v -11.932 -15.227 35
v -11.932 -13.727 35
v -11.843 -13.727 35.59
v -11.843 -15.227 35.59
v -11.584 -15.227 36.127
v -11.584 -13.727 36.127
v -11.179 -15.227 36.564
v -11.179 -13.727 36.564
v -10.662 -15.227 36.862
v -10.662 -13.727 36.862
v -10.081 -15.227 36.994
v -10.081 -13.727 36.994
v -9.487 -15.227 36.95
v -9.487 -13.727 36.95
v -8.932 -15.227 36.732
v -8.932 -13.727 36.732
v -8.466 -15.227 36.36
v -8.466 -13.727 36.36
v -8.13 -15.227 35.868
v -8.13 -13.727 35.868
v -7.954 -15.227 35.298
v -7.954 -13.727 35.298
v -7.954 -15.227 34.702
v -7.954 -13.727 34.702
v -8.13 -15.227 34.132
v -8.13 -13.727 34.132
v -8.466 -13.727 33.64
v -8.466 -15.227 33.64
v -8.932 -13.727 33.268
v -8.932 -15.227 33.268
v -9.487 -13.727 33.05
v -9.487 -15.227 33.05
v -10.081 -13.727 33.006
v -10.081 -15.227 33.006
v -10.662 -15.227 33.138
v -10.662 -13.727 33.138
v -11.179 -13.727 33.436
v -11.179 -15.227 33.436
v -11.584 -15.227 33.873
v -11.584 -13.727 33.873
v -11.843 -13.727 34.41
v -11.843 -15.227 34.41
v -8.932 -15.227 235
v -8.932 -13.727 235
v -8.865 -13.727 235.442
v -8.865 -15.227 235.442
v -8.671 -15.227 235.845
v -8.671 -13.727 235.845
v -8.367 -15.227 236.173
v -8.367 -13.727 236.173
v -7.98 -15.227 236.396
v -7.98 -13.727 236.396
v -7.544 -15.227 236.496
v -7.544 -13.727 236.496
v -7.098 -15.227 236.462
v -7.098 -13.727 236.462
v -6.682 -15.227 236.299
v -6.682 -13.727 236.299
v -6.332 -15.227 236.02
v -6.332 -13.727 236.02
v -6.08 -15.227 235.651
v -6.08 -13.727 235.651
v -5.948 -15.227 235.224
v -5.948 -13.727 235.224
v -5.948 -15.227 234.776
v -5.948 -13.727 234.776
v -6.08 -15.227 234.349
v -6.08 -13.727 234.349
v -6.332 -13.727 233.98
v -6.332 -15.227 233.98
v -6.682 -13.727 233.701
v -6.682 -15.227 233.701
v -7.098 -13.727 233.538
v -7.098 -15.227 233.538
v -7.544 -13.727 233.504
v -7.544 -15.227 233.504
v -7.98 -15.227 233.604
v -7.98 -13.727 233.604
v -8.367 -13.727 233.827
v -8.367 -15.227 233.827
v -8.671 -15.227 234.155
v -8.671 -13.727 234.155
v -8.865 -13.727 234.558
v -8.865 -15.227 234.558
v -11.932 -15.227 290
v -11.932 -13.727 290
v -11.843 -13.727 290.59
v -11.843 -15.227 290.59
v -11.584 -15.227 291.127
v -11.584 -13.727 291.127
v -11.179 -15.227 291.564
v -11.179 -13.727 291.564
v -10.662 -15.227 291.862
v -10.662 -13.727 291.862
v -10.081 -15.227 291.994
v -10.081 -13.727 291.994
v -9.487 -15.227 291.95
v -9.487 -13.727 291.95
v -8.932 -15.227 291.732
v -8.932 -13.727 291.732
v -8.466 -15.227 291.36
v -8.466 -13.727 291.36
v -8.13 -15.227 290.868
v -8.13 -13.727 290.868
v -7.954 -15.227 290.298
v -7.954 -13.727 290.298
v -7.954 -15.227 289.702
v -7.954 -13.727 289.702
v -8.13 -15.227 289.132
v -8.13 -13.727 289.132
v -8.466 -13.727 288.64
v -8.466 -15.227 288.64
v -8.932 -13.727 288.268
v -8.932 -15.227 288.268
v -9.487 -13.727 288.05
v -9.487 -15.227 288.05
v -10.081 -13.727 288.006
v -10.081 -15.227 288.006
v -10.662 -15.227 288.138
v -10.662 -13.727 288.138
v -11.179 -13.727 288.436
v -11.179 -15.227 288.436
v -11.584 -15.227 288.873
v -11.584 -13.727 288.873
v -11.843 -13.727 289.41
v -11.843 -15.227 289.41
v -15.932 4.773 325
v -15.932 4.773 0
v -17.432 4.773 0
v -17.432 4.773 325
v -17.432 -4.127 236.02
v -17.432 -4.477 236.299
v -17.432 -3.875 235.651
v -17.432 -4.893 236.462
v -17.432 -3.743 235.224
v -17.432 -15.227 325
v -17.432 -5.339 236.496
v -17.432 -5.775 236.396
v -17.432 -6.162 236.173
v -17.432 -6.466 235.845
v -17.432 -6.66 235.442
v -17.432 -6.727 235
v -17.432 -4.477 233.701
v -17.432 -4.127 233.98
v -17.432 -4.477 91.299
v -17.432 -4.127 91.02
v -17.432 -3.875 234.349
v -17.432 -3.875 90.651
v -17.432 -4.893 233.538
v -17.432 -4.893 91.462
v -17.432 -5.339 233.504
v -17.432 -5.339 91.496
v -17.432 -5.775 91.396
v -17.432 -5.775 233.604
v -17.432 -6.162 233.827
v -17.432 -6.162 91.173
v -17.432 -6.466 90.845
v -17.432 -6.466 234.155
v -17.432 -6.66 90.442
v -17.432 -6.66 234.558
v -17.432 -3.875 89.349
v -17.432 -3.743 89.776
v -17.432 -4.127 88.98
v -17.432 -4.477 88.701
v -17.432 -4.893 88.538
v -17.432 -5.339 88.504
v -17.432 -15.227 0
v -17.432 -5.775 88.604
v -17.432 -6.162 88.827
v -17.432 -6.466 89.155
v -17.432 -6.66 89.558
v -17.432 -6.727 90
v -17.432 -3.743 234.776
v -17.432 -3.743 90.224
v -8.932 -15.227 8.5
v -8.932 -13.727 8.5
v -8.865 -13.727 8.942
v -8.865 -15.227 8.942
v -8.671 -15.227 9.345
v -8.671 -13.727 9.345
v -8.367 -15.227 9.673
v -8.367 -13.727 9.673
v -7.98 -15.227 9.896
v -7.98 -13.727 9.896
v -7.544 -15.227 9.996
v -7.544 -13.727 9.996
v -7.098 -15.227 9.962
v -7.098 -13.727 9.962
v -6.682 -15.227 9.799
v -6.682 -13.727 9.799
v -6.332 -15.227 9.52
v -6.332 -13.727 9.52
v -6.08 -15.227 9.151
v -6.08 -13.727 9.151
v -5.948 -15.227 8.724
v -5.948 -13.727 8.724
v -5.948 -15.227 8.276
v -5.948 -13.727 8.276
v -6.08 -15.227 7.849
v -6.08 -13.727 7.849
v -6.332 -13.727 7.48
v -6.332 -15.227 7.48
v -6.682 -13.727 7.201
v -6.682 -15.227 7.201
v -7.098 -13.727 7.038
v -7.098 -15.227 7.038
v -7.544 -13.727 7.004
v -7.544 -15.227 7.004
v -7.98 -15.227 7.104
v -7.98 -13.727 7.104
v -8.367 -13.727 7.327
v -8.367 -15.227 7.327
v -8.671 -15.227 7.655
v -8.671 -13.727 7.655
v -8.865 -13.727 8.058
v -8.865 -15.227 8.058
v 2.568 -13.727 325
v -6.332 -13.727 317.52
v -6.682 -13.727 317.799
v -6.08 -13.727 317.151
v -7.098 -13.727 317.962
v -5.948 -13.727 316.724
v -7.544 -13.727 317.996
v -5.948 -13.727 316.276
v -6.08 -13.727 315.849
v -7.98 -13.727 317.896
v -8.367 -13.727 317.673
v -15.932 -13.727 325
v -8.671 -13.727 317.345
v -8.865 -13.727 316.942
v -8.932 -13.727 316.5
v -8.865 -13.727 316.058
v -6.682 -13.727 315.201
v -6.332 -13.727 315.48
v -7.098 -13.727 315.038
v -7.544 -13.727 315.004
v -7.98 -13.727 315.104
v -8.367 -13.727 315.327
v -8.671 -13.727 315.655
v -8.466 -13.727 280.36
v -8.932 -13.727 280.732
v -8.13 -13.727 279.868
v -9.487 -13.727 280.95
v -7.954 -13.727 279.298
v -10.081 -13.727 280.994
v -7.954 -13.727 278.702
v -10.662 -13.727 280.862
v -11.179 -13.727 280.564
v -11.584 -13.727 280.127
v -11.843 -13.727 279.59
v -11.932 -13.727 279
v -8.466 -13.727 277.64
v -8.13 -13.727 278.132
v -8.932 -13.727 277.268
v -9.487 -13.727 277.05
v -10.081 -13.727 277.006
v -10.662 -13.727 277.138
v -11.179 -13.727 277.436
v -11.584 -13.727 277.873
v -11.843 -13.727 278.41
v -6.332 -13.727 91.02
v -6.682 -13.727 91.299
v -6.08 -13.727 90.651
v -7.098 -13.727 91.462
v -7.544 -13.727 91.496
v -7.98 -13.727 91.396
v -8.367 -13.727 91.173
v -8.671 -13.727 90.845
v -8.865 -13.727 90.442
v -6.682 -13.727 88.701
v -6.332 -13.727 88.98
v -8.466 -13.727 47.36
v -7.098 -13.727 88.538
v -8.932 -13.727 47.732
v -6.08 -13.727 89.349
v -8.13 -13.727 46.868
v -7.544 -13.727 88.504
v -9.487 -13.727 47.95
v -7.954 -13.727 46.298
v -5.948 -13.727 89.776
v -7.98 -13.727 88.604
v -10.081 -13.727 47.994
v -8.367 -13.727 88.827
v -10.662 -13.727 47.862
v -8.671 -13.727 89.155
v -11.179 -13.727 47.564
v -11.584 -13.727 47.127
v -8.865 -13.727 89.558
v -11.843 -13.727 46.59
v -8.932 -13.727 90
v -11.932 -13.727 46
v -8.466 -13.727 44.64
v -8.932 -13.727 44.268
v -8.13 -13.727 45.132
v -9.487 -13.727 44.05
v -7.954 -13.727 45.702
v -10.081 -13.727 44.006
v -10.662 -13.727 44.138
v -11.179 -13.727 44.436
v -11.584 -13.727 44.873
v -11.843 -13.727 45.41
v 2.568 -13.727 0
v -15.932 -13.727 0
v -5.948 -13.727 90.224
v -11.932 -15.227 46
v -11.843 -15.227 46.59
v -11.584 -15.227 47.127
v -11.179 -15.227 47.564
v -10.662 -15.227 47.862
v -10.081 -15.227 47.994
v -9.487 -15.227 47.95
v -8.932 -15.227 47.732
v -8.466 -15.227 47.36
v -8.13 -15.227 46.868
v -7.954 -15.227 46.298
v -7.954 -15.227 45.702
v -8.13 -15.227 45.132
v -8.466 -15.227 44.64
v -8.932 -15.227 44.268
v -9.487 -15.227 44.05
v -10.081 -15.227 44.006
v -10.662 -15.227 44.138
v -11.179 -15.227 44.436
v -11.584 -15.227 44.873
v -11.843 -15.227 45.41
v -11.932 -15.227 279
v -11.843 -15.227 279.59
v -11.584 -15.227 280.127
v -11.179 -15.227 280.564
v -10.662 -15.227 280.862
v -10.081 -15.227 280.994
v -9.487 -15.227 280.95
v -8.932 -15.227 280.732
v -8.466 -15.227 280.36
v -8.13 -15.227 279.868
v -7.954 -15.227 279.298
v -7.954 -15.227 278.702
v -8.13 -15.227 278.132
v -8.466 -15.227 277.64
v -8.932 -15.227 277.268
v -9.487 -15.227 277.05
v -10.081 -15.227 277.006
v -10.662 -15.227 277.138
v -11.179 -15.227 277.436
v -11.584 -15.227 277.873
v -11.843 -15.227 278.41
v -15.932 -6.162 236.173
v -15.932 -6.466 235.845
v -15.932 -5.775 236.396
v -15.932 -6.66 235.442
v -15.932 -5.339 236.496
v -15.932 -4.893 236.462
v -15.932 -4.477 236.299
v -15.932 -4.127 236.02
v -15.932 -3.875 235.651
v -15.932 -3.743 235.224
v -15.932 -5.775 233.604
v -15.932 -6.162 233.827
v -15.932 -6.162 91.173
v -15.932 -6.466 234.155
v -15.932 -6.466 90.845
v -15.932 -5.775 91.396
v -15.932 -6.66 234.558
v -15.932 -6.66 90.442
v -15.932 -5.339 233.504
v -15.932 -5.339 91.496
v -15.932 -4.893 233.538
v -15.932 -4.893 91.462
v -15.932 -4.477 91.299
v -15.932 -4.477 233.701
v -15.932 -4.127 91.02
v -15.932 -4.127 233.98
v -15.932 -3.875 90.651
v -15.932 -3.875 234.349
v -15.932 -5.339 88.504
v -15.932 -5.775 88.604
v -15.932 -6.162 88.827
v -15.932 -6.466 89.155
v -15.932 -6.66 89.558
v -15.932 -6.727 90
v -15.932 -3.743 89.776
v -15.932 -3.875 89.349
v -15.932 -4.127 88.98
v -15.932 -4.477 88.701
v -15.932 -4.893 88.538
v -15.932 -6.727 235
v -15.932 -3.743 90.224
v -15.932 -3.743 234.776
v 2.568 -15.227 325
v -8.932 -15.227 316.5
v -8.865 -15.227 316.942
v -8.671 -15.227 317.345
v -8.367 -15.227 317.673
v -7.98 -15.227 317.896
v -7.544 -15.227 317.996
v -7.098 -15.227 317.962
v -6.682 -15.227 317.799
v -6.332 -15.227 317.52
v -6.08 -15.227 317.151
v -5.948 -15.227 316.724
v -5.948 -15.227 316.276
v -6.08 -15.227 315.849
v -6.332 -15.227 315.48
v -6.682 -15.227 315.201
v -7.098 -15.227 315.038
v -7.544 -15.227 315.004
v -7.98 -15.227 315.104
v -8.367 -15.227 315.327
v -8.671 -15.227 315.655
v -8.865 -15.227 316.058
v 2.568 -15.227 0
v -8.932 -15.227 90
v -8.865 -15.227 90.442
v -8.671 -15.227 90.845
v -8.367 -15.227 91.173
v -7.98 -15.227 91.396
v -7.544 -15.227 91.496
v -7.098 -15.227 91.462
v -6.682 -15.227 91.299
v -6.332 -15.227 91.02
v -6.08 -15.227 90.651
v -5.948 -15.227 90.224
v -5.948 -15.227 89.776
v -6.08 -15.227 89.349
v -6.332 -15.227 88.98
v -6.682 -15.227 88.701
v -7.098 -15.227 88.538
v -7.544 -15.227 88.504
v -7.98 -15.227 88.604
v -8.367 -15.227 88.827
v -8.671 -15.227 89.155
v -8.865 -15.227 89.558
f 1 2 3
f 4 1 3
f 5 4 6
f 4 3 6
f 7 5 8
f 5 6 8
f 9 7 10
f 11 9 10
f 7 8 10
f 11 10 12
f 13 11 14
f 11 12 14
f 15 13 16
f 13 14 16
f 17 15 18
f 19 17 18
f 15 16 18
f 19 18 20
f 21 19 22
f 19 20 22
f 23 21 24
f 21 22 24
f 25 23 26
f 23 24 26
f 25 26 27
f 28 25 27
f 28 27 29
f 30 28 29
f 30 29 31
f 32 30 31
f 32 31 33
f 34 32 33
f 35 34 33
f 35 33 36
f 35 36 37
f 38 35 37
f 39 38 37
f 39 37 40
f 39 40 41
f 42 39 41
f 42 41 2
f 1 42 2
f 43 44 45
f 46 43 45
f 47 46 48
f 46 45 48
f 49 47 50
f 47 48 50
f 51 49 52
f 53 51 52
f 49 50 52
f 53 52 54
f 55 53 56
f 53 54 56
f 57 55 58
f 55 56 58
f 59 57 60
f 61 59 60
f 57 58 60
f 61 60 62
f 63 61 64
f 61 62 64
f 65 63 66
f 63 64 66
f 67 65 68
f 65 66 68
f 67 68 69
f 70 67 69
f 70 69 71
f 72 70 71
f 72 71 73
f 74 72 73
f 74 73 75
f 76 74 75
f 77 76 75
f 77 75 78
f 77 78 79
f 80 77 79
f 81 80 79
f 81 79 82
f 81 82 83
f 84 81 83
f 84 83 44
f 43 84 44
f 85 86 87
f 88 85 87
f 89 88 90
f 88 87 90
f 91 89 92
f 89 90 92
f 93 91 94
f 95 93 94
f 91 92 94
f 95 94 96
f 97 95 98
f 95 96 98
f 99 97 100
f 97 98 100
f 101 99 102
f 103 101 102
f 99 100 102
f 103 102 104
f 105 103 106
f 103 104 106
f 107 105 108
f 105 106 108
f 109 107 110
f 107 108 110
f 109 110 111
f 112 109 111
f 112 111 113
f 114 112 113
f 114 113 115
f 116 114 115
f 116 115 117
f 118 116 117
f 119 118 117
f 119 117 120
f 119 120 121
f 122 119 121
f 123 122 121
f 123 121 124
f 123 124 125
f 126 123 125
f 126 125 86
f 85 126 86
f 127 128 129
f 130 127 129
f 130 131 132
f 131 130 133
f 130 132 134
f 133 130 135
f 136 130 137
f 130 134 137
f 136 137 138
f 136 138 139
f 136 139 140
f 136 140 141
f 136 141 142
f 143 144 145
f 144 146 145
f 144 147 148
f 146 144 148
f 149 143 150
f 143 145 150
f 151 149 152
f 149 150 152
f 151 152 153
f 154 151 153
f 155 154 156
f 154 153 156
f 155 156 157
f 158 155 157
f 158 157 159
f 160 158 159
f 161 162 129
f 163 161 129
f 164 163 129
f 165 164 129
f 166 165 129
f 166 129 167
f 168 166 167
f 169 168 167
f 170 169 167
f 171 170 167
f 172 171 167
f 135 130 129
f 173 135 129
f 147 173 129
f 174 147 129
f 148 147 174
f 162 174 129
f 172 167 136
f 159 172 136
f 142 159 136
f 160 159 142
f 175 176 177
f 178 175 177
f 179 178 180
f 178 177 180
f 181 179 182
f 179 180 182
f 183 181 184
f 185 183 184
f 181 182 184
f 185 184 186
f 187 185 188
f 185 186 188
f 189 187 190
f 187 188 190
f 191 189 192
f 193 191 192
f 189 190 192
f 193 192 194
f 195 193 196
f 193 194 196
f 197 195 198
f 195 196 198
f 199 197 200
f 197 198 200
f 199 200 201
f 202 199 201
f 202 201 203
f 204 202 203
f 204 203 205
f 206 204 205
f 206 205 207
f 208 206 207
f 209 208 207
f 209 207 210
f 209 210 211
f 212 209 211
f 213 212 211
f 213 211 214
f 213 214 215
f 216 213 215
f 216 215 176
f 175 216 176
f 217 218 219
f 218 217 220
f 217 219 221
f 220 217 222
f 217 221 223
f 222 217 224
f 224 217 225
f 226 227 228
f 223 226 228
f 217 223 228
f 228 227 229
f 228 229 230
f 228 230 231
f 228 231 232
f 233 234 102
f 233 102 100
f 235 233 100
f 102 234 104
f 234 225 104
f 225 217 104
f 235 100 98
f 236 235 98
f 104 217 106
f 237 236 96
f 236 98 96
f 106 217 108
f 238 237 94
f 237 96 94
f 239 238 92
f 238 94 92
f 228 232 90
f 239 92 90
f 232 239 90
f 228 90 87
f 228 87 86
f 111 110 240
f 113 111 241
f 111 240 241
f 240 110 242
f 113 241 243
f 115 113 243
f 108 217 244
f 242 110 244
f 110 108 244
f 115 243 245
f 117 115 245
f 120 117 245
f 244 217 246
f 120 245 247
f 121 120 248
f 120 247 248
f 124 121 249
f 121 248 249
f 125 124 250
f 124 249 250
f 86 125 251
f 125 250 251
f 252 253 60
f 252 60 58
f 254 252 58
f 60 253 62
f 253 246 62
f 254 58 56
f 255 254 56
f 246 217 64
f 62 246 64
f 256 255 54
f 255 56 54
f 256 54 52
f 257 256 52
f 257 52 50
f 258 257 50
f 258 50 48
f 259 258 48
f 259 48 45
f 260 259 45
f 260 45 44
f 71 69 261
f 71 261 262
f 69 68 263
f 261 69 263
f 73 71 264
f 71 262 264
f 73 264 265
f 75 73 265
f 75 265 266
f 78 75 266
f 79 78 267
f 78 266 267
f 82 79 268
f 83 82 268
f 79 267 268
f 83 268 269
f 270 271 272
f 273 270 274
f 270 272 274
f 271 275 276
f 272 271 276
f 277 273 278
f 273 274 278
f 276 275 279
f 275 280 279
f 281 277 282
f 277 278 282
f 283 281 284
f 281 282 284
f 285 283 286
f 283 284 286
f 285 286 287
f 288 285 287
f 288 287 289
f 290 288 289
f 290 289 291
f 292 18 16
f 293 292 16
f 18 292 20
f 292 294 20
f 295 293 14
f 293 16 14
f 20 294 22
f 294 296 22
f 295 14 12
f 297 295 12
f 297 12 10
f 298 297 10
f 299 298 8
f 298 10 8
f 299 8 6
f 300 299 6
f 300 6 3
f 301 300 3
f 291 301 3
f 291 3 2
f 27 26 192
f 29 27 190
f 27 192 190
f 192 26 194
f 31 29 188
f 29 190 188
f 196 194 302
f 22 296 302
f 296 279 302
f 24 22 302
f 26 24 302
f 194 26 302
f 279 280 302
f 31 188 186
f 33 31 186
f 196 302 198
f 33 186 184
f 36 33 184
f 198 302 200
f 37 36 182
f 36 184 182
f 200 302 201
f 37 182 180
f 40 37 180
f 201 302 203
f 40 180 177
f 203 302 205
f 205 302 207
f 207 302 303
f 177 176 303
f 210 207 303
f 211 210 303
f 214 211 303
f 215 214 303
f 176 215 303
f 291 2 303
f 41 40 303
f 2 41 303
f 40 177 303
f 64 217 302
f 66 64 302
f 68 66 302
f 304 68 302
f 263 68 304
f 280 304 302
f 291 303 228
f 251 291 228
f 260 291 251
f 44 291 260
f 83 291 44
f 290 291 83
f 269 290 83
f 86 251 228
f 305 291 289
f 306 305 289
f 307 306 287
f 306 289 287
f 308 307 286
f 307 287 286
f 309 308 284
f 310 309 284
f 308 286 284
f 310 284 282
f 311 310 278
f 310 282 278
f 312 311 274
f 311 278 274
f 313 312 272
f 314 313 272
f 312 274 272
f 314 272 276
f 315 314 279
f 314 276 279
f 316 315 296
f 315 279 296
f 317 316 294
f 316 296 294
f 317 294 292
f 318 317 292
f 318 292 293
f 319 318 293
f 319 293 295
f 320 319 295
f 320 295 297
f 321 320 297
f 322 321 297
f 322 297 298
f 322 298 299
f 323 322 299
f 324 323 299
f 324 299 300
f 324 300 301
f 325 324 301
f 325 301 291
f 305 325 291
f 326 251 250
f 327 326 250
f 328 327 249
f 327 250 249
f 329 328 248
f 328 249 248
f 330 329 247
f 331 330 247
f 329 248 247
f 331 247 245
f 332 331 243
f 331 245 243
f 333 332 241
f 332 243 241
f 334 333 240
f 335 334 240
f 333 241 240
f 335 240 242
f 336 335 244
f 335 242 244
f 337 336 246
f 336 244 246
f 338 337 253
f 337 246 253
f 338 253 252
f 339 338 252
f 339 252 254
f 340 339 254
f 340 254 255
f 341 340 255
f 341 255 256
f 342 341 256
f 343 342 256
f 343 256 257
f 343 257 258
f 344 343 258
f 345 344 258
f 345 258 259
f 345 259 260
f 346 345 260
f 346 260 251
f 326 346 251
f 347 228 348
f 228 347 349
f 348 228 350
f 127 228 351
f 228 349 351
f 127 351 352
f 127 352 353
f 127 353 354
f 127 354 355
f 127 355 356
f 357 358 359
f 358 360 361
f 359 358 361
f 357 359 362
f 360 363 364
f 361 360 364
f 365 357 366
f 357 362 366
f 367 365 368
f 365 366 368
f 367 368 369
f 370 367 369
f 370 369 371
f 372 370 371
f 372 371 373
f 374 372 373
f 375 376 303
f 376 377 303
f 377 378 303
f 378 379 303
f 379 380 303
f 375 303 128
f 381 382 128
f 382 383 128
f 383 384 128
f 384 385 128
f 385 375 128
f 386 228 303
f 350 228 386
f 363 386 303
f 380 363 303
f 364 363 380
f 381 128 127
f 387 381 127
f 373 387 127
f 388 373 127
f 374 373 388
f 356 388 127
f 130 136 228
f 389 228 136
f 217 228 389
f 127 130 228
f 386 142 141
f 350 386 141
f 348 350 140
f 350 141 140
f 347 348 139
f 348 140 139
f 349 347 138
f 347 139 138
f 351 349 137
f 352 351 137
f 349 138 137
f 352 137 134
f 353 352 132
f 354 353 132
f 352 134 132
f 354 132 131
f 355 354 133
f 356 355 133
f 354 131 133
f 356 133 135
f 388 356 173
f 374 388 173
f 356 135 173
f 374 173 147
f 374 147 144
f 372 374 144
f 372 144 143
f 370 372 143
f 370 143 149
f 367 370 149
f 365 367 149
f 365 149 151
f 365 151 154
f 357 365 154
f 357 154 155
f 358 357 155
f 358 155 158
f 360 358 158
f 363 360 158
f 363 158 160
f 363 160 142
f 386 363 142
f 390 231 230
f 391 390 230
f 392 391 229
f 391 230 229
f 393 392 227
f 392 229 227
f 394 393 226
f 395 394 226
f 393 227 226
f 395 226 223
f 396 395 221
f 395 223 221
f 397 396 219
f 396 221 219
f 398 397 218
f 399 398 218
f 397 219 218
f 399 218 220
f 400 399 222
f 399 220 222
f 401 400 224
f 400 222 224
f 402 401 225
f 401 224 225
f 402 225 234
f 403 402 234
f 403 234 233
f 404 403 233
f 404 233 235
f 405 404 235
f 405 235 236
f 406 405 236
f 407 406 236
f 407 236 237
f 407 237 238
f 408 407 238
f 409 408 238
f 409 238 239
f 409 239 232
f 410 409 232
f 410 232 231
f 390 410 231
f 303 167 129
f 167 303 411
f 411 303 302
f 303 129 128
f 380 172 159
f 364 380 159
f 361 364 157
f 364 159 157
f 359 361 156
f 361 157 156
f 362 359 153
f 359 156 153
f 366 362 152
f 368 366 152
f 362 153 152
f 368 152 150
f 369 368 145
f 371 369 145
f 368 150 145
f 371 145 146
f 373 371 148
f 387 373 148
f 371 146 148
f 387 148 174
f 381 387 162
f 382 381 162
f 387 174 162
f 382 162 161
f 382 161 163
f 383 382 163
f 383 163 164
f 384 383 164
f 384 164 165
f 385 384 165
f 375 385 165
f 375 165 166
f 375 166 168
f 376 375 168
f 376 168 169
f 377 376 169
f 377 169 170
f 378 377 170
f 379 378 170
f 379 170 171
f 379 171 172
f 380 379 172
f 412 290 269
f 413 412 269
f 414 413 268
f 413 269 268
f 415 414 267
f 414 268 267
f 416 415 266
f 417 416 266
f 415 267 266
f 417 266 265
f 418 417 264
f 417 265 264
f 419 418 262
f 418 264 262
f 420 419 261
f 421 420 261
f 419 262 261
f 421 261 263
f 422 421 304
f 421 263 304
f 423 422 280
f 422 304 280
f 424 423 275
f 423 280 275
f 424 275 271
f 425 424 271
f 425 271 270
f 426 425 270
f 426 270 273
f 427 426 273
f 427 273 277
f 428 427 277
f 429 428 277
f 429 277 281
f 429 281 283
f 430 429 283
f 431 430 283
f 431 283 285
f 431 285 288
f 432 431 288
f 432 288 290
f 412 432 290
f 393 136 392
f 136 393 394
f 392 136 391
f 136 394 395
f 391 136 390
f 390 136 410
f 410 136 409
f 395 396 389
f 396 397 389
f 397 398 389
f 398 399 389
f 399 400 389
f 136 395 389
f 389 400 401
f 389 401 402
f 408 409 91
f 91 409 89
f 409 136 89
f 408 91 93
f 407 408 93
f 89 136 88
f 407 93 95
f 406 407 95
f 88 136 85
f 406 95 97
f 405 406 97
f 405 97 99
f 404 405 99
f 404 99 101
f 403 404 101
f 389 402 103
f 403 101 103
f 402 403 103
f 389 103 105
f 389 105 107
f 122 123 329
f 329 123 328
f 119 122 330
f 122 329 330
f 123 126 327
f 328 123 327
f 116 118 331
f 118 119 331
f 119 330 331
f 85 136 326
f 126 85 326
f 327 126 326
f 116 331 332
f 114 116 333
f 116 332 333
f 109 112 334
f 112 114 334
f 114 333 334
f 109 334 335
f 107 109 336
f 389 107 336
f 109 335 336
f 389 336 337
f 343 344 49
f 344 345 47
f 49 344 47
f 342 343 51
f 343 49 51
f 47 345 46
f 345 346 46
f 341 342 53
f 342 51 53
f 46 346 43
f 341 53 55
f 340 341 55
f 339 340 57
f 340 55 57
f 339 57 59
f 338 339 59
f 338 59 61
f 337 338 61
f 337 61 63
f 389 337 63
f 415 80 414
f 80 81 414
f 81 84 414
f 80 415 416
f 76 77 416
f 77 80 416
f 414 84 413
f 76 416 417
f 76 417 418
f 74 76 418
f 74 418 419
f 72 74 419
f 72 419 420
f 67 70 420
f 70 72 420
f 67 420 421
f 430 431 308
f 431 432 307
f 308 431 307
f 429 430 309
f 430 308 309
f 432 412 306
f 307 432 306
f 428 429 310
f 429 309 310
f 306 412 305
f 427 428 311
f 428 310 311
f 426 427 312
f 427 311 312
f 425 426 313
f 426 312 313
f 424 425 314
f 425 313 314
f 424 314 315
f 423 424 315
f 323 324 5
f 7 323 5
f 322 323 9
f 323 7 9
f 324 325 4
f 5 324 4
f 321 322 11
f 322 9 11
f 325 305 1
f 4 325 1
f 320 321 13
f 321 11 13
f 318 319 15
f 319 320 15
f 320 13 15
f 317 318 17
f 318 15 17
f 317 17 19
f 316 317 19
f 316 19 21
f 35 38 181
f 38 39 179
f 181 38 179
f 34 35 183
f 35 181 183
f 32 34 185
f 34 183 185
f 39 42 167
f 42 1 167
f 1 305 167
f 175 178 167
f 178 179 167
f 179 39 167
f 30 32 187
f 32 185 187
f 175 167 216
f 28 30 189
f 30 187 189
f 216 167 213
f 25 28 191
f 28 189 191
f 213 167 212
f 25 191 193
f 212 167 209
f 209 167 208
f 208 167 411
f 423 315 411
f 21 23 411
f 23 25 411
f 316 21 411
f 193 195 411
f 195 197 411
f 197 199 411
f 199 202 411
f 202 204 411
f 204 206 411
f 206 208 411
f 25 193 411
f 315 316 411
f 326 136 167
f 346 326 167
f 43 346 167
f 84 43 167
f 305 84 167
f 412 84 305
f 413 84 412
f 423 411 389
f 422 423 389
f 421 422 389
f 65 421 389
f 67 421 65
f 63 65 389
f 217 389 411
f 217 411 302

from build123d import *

# Parameters (mm, degrees)
EXTRUSION1_DEPTH = 325
ESQUISSE2_R      = 1.5
ESQUISSE2_R_2    = 2
EXTRUSION2_DEPTH = 300
ESQUISSE3_R      = 1.5
EXTRUSION3_DEPTH = 10


with BuildPart() as part:
    # Esquisse1 → Extrusion1 (new body)
    with BuildSketch(Plane.XY):
        Polygon((-17.43168638, 4.773368421), (-17.43168638, -15.226631579), (2.56831362, -15.226631579), (2.56831362, -13.726631579), (-15.93168638, -13.726631579), (-15.93168638, 4.773368421), align=None)
    extrude(amount=EXTRUSION1_DEPTH)

    # Esquisse2 → Extrusion2 (cut)
    with BuildSketch(Plane(origin=(0, -13.726631579, 0), x_dir=(-1, 0, 0), z_dir=(0, 1, 0))):
        with Locations((7.43168638, 8.5)):
            Circle(ESQUISSE2_R)
        with Locations((7.43168638, 316.5)):
            Circle(ESQUISSE2_R)
        with Locations((9.93168638, 35)):
            Circle(ESQUISSE2_R_2)
        with Locations((9.93168638, 46)):
            Circle(ESQUISSE2_R_2)
        with Locations((9.93168638, 290)):
            Circle(ESQUISSE2_R_2)
        with Locations((9.93168638, 279)):
            Circle(ESQUISSE2_R_2)
        with Locations((7.43168638, 235)):
            Circle(ESQUISSE2_R)
        with Locations((7.43168638, 90)):
            Circle(ESQUISSE2_R)
    extrude(amount=-EXTRUSION2_DEPTH, mode=Mode.SUBTRACT)

    # Esquisse3 → Extrusion3 (cut)
    with BuildSketch(Plane.ZY.offset(17.43168638)):
        with Locations(Location((235, -5.226631579, 0), (0, 0, 270))):
            Circle(ESQUISSE3_R)
        with Locations(Location((90, -5.226631579, 0), (0, 0, 270))):
            Circle(ESQUISSE3_R)
    extrude(amount=-EXTRUSION3_DEPTH, mode=Mode.SUBTRACT)


solid = part.part
